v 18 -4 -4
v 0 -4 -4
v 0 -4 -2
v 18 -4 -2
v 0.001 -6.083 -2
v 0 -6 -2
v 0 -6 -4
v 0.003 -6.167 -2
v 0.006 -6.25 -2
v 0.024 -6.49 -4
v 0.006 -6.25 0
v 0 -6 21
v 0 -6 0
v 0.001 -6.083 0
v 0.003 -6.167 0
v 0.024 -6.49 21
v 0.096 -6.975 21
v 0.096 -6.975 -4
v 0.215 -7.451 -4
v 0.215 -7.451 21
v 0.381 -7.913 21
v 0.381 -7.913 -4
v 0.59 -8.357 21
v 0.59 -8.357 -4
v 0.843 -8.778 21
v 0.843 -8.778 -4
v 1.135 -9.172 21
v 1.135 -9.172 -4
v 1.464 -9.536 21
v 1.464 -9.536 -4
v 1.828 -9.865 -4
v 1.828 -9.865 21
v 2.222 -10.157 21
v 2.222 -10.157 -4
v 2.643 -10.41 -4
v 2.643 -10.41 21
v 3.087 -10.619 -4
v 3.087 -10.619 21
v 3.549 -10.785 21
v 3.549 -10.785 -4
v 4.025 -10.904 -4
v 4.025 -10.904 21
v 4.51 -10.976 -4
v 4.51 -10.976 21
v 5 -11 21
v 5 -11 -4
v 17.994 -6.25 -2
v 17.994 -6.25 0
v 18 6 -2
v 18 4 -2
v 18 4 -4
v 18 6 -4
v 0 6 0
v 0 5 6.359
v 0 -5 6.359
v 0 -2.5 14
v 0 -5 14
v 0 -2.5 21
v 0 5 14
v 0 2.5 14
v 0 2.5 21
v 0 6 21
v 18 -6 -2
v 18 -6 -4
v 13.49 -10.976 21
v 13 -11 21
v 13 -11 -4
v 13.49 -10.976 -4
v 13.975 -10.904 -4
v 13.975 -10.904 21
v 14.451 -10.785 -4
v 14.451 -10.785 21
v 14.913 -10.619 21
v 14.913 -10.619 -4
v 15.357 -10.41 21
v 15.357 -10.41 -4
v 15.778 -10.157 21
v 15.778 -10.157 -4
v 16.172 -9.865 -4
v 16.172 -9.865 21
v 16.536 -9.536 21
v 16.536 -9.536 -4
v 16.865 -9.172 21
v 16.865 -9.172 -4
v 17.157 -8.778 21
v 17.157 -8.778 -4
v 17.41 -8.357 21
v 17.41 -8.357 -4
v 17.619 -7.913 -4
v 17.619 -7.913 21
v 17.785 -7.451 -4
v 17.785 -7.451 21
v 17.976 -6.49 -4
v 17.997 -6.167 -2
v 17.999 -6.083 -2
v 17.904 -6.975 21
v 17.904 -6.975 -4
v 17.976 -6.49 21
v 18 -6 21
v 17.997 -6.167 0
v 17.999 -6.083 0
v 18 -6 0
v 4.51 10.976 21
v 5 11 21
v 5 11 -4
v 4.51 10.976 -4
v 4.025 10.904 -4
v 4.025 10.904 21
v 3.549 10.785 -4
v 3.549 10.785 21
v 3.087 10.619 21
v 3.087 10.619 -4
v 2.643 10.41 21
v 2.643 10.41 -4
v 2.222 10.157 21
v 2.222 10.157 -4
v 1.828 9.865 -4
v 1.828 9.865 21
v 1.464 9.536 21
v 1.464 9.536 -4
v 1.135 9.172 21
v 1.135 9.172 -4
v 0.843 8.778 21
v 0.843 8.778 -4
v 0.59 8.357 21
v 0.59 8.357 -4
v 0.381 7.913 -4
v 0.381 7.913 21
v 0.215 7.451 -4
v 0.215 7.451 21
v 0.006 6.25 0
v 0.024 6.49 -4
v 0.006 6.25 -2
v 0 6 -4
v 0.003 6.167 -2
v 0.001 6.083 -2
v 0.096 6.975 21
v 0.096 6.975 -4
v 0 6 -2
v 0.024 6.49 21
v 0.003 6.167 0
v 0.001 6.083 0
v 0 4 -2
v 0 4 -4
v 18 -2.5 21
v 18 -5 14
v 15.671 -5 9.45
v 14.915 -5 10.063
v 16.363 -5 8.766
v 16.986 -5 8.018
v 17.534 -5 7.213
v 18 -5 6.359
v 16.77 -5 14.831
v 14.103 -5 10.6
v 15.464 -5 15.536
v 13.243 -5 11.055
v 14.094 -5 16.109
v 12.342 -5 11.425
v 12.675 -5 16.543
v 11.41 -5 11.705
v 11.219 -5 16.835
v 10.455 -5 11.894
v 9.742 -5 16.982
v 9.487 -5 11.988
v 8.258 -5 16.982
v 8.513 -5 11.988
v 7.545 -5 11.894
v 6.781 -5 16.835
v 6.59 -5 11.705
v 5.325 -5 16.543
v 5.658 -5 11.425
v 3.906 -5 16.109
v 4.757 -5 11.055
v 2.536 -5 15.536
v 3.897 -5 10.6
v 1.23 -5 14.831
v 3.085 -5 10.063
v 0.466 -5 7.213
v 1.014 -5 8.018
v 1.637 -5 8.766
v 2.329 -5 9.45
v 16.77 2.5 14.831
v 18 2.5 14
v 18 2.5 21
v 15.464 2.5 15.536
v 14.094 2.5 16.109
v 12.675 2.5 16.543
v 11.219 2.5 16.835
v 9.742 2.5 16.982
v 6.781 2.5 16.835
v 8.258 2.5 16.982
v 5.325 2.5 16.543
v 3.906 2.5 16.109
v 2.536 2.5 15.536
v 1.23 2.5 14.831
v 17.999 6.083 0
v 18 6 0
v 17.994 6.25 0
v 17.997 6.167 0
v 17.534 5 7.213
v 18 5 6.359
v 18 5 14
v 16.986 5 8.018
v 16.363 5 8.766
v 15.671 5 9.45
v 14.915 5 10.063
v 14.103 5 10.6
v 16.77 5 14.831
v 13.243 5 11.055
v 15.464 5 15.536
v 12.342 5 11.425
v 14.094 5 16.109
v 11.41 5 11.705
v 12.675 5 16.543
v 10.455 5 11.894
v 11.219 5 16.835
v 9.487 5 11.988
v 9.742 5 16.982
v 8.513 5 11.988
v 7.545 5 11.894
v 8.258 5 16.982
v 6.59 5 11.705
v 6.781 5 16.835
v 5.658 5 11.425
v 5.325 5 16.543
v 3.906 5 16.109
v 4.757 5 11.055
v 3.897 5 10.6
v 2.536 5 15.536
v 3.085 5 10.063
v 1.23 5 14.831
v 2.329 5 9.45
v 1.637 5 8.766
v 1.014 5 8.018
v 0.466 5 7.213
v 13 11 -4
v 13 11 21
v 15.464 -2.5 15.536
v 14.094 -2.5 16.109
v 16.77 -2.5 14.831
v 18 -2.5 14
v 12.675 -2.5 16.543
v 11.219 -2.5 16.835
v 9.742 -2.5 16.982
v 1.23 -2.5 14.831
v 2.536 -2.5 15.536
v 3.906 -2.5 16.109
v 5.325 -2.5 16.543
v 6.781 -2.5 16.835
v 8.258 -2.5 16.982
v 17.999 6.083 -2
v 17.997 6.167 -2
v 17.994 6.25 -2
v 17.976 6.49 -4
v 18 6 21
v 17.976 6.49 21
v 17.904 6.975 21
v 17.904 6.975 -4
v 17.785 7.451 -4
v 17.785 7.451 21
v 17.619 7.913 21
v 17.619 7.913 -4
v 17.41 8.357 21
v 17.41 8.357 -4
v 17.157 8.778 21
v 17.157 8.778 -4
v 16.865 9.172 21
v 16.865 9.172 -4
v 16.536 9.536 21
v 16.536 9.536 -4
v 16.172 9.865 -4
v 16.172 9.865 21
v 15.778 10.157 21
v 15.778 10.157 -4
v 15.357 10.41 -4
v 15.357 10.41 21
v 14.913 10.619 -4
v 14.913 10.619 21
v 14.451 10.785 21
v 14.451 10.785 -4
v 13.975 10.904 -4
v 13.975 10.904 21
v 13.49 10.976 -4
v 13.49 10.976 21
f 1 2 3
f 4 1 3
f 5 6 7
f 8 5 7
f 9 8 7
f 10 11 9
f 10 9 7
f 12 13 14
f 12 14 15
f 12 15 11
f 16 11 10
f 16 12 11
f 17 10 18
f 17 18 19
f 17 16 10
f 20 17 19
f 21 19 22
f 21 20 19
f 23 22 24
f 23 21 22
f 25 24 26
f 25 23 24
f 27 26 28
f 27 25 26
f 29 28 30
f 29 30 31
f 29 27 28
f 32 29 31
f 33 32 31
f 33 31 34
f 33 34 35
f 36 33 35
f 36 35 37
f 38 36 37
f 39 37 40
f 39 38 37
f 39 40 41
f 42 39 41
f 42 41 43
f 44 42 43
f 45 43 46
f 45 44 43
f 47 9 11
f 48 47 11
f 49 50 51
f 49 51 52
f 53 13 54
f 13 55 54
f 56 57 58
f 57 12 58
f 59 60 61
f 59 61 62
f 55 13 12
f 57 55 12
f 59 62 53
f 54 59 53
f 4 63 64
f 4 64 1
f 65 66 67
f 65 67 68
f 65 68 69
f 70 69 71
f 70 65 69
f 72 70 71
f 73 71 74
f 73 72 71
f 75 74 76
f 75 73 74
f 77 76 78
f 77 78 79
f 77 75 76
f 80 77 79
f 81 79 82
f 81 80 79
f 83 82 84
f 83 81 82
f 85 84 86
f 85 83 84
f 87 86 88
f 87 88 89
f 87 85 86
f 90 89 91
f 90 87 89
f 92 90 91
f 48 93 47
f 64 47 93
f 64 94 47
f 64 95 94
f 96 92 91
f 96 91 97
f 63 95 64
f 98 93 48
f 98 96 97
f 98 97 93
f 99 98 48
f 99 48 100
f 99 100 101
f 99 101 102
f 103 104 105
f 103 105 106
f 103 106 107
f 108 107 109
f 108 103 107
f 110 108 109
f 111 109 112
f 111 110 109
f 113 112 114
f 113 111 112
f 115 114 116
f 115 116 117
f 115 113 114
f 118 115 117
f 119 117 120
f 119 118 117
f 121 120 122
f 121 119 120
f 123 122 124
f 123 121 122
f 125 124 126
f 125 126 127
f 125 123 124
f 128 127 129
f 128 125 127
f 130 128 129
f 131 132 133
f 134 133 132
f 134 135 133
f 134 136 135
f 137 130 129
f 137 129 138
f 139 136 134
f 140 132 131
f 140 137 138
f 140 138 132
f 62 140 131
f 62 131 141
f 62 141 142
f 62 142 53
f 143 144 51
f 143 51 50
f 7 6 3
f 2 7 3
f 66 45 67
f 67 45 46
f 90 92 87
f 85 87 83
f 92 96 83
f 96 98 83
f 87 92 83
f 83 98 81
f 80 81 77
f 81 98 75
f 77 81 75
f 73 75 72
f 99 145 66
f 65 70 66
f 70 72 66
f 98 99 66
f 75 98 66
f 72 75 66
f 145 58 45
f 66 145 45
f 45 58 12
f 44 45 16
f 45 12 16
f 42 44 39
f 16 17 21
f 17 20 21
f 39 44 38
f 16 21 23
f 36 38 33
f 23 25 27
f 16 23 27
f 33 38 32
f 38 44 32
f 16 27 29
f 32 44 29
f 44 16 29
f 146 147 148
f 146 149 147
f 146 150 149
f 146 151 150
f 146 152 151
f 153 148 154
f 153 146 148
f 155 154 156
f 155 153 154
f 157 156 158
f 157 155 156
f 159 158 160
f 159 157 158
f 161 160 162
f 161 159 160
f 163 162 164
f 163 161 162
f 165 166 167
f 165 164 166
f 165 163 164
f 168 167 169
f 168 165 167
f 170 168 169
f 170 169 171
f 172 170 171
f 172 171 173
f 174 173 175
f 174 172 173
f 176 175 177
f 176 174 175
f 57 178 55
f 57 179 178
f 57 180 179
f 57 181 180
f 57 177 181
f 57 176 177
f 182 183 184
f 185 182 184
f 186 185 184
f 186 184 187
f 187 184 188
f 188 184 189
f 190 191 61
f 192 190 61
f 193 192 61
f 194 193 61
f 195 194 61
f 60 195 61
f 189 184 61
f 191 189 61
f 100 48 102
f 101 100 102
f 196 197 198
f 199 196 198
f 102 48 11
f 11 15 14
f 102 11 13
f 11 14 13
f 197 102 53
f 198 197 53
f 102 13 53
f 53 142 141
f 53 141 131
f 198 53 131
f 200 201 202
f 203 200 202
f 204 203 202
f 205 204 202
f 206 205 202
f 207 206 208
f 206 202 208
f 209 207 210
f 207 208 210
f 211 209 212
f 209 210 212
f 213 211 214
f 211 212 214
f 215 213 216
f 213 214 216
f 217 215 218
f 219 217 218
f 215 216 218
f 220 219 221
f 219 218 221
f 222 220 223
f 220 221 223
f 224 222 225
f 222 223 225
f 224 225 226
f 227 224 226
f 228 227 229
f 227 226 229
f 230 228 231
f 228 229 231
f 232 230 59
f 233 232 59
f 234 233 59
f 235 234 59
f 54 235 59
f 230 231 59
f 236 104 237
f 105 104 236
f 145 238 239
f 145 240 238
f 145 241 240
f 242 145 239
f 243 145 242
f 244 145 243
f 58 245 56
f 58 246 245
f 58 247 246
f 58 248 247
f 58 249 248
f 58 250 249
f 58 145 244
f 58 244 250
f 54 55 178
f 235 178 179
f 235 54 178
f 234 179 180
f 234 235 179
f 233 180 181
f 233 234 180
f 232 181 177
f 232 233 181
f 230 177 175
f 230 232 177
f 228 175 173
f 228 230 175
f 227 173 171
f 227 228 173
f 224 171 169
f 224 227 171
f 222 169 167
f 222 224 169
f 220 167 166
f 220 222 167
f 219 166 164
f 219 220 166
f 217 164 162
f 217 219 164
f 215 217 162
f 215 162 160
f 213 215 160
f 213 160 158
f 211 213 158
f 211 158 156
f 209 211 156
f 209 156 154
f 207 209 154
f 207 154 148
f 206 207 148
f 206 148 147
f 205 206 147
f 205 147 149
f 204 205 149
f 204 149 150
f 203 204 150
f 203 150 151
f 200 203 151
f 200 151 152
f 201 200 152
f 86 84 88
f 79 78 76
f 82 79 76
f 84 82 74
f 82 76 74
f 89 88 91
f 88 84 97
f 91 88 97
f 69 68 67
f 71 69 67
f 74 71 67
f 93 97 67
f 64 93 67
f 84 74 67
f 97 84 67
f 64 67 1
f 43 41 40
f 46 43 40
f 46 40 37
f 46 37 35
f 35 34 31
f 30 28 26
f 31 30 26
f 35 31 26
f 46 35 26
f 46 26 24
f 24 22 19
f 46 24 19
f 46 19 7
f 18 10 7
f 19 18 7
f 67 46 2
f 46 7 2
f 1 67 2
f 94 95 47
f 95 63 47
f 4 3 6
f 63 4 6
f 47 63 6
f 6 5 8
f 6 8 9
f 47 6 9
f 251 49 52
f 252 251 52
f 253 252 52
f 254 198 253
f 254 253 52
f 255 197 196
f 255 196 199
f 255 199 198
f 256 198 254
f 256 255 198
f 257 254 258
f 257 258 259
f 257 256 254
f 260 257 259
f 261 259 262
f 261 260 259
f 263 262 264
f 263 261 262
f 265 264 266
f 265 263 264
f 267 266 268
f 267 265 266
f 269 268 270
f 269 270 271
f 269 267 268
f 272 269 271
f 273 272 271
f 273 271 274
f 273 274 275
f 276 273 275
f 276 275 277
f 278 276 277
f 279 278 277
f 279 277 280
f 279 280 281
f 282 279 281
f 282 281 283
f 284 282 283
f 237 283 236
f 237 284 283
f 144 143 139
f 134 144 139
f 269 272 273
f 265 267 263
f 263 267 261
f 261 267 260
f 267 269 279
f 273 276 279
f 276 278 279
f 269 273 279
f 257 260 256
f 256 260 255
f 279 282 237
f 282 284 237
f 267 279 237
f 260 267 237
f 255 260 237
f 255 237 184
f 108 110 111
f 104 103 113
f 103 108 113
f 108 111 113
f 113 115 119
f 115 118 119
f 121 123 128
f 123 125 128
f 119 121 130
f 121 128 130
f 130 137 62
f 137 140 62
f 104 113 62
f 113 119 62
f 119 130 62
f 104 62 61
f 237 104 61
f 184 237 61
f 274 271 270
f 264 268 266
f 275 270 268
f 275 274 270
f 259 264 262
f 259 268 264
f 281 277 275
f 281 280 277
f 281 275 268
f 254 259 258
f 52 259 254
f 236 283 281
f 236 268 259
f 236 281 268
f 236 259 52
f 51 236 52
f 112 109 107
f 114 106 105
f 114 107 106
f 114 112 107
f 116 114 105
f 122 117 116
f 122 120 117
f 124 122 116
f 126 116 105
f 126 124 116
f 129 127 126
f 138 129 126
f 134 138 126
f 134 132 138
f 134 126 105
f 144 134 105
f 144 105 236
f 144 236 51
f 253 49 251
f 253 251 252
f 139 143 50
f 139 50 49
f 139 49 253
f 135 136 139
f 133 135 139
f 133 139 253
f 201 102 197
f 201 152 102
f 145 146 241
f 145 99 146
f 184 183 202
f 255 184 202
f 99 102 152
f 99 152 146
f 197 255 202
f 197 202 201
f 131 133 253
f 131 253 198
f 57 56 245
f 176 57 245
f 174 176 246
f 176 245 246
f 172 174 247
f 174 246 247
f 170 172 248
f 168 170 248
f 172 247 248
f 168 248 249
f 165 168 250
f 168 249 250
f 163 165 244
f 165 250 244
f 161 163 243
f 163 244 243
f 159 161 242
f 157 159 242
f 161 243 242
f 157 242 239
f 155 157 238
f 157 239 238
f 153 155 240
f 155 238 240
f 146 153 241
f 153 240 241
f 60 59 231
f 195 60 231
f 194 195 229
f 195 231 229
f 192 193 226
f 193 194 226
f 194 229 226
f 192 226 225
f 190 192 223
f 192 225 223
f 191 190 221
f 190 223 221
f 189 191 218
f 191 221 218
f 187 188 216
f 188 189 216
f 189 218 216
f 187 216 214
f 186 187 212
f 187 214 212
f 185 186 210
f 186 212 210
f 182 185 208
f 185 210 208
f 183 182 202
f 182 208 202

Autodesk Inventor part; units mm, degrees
ref_plane "YZ Plane" through (0, 0, 0) normal (1, 0, 0) x (0, 1, 0)
ref_plane "XZ Plane" through (0, 0, 0) normal (0, 1, 0) x (-1, 0, 0)
sketch "Sketch1" plane through (0, 0, 0) normal (1, 0, 0) x (0, 1, 0)
  line L0 (0, -9) -> (0, 26) projected
  line L1 (0, 21) -> (-11, 21)
  line L2 (-11, 21) -> (-11, -4)
  line L3 (-11, -4) -> (-4, -4)
  line L4 (-4, -4) -> (-4, -2)
  line L5 (-4, -2) -> (-6.25, -2)
  line L6 (-6.25, -2) -> (-6.25, 0)
  line L7 (-6.25, 0) -> (0, 0)
  line L8 (0, 21) -> (11, 21)
  line L9 (11, 21) -> (11, -4)
  line L10 (11, -4) -> (4, -4)
  line L11 (4, -4) -> (4, -2)
  line L12 (4, -2) -> (6.25, -2)
  line L13 (6.25, -2) -> (6.25, 0)
  line L14 (6.25, 0) -> (0, 0)
  dimension "d1" = 22
  dimension "d2" = 25
  dimension "d3" = 12.5
  dimension "d4" = 8
  dimension "d5" = 4
  dimension "d6" = 2
extrude "Extrusion1" add sketch "Sketch1" along normal blind 18
fillet "Fillet1" radius 5 4 edges at (0, -11, 8.5) (18, -11, 8.5) (18, 11, 8.5) (0, 11, 8.5)
sketch "Sketch2" plane through (0, 0, 0) normal (0, 1, 0) x (-1, 0, 0)
  line L0 (-18, 0) -> (-18, 21) construction
  line L1 (-5, 21) -> (-13, 21) construction
  line L2 (-9, 21) -> (-9, -4)
  line L3 (0, -4) -> (-18, -4) construction
  line L4 (0, 0) -> (0, 0) construction
  arc A0 (0, 6.3589) -> (-18, 6.3589) centre (-9, 2) ccw
  arc A1 (0, 14) -> (-18, 14) centre (-9, 2) ccw
  line L5 (-18, 14) -> (-18, 6.3589)
  line L6 (0, 6.3589) -> (0, 14)
  line L7 (0, 14) -> (0, 6.3589)
  line L8 (-18, 14) -> (-18, 21)
  line L9 (-18, 21) -> (0, 21)
  line L10 (0, 21) -> (0, 14)
  dimension "d10" = 10
  dimension "d11" = 6
  dimension "d18" = 5
extrude "Extrusion2" cut sketch "Sketch2" against normal mid plane 10 contours A1 L6 A0 L2 | L2 A0 L5 A1
extrude "Extrusion3" cut sketch "Sketch2" against normal mid plane 5 contours L9 L10 A1 L2 | L2 A1 L8 L9
ref_plane "ULC_ULG" through (18, 0, 0) normal (1, 0, 0) x (0, 0, -1)
equation "\"d1\" = W_"
equation "\"d2\" = H_"
equation "\"d3\" = ULC_ULG_W1"
equation "\"d4\" = ULC_ULG_W2"
equation "\"d5\" = ULC_ULG_H1"
equation "\"d6\" = ULC_ULG_H2"
equation "\"d7\" = L"
equation "\"d9\" = ULC_a1"
equation "\"d10\" = R"
equation "\"d11\" = RC"
equation "\"d18\" = ULC_ULB_H"
equation "\"d19\" = ULC_ULB_Wmin"
equation "\"d23\" = ULC_ULB_W1"
equation "\"ULC_ULB_H\" = 5"
equation "\"W_\" = 22"
equation "\"L\" = 18"
equation "\"H_\" = 25"
equation "\"RC\" = 6"
equation "\"R\" = 10"
equation "\"ULC_ULB_Wmin\" = 10"
equation "\"ULC_ULB_W1\" = 5"
equation "\"ULC_ULG_W1\" = 12.5"
equation "\"ULC_ULG_W2\" = 8"
equation "\"ULC_ULG_H1\" = 4"
equation "\"ULC_ULG_H2\" = 2"
equation "\"ULC_a1\" = 5"
properties part number "\"ULC 1001\"" material "DIN 1.2344"
